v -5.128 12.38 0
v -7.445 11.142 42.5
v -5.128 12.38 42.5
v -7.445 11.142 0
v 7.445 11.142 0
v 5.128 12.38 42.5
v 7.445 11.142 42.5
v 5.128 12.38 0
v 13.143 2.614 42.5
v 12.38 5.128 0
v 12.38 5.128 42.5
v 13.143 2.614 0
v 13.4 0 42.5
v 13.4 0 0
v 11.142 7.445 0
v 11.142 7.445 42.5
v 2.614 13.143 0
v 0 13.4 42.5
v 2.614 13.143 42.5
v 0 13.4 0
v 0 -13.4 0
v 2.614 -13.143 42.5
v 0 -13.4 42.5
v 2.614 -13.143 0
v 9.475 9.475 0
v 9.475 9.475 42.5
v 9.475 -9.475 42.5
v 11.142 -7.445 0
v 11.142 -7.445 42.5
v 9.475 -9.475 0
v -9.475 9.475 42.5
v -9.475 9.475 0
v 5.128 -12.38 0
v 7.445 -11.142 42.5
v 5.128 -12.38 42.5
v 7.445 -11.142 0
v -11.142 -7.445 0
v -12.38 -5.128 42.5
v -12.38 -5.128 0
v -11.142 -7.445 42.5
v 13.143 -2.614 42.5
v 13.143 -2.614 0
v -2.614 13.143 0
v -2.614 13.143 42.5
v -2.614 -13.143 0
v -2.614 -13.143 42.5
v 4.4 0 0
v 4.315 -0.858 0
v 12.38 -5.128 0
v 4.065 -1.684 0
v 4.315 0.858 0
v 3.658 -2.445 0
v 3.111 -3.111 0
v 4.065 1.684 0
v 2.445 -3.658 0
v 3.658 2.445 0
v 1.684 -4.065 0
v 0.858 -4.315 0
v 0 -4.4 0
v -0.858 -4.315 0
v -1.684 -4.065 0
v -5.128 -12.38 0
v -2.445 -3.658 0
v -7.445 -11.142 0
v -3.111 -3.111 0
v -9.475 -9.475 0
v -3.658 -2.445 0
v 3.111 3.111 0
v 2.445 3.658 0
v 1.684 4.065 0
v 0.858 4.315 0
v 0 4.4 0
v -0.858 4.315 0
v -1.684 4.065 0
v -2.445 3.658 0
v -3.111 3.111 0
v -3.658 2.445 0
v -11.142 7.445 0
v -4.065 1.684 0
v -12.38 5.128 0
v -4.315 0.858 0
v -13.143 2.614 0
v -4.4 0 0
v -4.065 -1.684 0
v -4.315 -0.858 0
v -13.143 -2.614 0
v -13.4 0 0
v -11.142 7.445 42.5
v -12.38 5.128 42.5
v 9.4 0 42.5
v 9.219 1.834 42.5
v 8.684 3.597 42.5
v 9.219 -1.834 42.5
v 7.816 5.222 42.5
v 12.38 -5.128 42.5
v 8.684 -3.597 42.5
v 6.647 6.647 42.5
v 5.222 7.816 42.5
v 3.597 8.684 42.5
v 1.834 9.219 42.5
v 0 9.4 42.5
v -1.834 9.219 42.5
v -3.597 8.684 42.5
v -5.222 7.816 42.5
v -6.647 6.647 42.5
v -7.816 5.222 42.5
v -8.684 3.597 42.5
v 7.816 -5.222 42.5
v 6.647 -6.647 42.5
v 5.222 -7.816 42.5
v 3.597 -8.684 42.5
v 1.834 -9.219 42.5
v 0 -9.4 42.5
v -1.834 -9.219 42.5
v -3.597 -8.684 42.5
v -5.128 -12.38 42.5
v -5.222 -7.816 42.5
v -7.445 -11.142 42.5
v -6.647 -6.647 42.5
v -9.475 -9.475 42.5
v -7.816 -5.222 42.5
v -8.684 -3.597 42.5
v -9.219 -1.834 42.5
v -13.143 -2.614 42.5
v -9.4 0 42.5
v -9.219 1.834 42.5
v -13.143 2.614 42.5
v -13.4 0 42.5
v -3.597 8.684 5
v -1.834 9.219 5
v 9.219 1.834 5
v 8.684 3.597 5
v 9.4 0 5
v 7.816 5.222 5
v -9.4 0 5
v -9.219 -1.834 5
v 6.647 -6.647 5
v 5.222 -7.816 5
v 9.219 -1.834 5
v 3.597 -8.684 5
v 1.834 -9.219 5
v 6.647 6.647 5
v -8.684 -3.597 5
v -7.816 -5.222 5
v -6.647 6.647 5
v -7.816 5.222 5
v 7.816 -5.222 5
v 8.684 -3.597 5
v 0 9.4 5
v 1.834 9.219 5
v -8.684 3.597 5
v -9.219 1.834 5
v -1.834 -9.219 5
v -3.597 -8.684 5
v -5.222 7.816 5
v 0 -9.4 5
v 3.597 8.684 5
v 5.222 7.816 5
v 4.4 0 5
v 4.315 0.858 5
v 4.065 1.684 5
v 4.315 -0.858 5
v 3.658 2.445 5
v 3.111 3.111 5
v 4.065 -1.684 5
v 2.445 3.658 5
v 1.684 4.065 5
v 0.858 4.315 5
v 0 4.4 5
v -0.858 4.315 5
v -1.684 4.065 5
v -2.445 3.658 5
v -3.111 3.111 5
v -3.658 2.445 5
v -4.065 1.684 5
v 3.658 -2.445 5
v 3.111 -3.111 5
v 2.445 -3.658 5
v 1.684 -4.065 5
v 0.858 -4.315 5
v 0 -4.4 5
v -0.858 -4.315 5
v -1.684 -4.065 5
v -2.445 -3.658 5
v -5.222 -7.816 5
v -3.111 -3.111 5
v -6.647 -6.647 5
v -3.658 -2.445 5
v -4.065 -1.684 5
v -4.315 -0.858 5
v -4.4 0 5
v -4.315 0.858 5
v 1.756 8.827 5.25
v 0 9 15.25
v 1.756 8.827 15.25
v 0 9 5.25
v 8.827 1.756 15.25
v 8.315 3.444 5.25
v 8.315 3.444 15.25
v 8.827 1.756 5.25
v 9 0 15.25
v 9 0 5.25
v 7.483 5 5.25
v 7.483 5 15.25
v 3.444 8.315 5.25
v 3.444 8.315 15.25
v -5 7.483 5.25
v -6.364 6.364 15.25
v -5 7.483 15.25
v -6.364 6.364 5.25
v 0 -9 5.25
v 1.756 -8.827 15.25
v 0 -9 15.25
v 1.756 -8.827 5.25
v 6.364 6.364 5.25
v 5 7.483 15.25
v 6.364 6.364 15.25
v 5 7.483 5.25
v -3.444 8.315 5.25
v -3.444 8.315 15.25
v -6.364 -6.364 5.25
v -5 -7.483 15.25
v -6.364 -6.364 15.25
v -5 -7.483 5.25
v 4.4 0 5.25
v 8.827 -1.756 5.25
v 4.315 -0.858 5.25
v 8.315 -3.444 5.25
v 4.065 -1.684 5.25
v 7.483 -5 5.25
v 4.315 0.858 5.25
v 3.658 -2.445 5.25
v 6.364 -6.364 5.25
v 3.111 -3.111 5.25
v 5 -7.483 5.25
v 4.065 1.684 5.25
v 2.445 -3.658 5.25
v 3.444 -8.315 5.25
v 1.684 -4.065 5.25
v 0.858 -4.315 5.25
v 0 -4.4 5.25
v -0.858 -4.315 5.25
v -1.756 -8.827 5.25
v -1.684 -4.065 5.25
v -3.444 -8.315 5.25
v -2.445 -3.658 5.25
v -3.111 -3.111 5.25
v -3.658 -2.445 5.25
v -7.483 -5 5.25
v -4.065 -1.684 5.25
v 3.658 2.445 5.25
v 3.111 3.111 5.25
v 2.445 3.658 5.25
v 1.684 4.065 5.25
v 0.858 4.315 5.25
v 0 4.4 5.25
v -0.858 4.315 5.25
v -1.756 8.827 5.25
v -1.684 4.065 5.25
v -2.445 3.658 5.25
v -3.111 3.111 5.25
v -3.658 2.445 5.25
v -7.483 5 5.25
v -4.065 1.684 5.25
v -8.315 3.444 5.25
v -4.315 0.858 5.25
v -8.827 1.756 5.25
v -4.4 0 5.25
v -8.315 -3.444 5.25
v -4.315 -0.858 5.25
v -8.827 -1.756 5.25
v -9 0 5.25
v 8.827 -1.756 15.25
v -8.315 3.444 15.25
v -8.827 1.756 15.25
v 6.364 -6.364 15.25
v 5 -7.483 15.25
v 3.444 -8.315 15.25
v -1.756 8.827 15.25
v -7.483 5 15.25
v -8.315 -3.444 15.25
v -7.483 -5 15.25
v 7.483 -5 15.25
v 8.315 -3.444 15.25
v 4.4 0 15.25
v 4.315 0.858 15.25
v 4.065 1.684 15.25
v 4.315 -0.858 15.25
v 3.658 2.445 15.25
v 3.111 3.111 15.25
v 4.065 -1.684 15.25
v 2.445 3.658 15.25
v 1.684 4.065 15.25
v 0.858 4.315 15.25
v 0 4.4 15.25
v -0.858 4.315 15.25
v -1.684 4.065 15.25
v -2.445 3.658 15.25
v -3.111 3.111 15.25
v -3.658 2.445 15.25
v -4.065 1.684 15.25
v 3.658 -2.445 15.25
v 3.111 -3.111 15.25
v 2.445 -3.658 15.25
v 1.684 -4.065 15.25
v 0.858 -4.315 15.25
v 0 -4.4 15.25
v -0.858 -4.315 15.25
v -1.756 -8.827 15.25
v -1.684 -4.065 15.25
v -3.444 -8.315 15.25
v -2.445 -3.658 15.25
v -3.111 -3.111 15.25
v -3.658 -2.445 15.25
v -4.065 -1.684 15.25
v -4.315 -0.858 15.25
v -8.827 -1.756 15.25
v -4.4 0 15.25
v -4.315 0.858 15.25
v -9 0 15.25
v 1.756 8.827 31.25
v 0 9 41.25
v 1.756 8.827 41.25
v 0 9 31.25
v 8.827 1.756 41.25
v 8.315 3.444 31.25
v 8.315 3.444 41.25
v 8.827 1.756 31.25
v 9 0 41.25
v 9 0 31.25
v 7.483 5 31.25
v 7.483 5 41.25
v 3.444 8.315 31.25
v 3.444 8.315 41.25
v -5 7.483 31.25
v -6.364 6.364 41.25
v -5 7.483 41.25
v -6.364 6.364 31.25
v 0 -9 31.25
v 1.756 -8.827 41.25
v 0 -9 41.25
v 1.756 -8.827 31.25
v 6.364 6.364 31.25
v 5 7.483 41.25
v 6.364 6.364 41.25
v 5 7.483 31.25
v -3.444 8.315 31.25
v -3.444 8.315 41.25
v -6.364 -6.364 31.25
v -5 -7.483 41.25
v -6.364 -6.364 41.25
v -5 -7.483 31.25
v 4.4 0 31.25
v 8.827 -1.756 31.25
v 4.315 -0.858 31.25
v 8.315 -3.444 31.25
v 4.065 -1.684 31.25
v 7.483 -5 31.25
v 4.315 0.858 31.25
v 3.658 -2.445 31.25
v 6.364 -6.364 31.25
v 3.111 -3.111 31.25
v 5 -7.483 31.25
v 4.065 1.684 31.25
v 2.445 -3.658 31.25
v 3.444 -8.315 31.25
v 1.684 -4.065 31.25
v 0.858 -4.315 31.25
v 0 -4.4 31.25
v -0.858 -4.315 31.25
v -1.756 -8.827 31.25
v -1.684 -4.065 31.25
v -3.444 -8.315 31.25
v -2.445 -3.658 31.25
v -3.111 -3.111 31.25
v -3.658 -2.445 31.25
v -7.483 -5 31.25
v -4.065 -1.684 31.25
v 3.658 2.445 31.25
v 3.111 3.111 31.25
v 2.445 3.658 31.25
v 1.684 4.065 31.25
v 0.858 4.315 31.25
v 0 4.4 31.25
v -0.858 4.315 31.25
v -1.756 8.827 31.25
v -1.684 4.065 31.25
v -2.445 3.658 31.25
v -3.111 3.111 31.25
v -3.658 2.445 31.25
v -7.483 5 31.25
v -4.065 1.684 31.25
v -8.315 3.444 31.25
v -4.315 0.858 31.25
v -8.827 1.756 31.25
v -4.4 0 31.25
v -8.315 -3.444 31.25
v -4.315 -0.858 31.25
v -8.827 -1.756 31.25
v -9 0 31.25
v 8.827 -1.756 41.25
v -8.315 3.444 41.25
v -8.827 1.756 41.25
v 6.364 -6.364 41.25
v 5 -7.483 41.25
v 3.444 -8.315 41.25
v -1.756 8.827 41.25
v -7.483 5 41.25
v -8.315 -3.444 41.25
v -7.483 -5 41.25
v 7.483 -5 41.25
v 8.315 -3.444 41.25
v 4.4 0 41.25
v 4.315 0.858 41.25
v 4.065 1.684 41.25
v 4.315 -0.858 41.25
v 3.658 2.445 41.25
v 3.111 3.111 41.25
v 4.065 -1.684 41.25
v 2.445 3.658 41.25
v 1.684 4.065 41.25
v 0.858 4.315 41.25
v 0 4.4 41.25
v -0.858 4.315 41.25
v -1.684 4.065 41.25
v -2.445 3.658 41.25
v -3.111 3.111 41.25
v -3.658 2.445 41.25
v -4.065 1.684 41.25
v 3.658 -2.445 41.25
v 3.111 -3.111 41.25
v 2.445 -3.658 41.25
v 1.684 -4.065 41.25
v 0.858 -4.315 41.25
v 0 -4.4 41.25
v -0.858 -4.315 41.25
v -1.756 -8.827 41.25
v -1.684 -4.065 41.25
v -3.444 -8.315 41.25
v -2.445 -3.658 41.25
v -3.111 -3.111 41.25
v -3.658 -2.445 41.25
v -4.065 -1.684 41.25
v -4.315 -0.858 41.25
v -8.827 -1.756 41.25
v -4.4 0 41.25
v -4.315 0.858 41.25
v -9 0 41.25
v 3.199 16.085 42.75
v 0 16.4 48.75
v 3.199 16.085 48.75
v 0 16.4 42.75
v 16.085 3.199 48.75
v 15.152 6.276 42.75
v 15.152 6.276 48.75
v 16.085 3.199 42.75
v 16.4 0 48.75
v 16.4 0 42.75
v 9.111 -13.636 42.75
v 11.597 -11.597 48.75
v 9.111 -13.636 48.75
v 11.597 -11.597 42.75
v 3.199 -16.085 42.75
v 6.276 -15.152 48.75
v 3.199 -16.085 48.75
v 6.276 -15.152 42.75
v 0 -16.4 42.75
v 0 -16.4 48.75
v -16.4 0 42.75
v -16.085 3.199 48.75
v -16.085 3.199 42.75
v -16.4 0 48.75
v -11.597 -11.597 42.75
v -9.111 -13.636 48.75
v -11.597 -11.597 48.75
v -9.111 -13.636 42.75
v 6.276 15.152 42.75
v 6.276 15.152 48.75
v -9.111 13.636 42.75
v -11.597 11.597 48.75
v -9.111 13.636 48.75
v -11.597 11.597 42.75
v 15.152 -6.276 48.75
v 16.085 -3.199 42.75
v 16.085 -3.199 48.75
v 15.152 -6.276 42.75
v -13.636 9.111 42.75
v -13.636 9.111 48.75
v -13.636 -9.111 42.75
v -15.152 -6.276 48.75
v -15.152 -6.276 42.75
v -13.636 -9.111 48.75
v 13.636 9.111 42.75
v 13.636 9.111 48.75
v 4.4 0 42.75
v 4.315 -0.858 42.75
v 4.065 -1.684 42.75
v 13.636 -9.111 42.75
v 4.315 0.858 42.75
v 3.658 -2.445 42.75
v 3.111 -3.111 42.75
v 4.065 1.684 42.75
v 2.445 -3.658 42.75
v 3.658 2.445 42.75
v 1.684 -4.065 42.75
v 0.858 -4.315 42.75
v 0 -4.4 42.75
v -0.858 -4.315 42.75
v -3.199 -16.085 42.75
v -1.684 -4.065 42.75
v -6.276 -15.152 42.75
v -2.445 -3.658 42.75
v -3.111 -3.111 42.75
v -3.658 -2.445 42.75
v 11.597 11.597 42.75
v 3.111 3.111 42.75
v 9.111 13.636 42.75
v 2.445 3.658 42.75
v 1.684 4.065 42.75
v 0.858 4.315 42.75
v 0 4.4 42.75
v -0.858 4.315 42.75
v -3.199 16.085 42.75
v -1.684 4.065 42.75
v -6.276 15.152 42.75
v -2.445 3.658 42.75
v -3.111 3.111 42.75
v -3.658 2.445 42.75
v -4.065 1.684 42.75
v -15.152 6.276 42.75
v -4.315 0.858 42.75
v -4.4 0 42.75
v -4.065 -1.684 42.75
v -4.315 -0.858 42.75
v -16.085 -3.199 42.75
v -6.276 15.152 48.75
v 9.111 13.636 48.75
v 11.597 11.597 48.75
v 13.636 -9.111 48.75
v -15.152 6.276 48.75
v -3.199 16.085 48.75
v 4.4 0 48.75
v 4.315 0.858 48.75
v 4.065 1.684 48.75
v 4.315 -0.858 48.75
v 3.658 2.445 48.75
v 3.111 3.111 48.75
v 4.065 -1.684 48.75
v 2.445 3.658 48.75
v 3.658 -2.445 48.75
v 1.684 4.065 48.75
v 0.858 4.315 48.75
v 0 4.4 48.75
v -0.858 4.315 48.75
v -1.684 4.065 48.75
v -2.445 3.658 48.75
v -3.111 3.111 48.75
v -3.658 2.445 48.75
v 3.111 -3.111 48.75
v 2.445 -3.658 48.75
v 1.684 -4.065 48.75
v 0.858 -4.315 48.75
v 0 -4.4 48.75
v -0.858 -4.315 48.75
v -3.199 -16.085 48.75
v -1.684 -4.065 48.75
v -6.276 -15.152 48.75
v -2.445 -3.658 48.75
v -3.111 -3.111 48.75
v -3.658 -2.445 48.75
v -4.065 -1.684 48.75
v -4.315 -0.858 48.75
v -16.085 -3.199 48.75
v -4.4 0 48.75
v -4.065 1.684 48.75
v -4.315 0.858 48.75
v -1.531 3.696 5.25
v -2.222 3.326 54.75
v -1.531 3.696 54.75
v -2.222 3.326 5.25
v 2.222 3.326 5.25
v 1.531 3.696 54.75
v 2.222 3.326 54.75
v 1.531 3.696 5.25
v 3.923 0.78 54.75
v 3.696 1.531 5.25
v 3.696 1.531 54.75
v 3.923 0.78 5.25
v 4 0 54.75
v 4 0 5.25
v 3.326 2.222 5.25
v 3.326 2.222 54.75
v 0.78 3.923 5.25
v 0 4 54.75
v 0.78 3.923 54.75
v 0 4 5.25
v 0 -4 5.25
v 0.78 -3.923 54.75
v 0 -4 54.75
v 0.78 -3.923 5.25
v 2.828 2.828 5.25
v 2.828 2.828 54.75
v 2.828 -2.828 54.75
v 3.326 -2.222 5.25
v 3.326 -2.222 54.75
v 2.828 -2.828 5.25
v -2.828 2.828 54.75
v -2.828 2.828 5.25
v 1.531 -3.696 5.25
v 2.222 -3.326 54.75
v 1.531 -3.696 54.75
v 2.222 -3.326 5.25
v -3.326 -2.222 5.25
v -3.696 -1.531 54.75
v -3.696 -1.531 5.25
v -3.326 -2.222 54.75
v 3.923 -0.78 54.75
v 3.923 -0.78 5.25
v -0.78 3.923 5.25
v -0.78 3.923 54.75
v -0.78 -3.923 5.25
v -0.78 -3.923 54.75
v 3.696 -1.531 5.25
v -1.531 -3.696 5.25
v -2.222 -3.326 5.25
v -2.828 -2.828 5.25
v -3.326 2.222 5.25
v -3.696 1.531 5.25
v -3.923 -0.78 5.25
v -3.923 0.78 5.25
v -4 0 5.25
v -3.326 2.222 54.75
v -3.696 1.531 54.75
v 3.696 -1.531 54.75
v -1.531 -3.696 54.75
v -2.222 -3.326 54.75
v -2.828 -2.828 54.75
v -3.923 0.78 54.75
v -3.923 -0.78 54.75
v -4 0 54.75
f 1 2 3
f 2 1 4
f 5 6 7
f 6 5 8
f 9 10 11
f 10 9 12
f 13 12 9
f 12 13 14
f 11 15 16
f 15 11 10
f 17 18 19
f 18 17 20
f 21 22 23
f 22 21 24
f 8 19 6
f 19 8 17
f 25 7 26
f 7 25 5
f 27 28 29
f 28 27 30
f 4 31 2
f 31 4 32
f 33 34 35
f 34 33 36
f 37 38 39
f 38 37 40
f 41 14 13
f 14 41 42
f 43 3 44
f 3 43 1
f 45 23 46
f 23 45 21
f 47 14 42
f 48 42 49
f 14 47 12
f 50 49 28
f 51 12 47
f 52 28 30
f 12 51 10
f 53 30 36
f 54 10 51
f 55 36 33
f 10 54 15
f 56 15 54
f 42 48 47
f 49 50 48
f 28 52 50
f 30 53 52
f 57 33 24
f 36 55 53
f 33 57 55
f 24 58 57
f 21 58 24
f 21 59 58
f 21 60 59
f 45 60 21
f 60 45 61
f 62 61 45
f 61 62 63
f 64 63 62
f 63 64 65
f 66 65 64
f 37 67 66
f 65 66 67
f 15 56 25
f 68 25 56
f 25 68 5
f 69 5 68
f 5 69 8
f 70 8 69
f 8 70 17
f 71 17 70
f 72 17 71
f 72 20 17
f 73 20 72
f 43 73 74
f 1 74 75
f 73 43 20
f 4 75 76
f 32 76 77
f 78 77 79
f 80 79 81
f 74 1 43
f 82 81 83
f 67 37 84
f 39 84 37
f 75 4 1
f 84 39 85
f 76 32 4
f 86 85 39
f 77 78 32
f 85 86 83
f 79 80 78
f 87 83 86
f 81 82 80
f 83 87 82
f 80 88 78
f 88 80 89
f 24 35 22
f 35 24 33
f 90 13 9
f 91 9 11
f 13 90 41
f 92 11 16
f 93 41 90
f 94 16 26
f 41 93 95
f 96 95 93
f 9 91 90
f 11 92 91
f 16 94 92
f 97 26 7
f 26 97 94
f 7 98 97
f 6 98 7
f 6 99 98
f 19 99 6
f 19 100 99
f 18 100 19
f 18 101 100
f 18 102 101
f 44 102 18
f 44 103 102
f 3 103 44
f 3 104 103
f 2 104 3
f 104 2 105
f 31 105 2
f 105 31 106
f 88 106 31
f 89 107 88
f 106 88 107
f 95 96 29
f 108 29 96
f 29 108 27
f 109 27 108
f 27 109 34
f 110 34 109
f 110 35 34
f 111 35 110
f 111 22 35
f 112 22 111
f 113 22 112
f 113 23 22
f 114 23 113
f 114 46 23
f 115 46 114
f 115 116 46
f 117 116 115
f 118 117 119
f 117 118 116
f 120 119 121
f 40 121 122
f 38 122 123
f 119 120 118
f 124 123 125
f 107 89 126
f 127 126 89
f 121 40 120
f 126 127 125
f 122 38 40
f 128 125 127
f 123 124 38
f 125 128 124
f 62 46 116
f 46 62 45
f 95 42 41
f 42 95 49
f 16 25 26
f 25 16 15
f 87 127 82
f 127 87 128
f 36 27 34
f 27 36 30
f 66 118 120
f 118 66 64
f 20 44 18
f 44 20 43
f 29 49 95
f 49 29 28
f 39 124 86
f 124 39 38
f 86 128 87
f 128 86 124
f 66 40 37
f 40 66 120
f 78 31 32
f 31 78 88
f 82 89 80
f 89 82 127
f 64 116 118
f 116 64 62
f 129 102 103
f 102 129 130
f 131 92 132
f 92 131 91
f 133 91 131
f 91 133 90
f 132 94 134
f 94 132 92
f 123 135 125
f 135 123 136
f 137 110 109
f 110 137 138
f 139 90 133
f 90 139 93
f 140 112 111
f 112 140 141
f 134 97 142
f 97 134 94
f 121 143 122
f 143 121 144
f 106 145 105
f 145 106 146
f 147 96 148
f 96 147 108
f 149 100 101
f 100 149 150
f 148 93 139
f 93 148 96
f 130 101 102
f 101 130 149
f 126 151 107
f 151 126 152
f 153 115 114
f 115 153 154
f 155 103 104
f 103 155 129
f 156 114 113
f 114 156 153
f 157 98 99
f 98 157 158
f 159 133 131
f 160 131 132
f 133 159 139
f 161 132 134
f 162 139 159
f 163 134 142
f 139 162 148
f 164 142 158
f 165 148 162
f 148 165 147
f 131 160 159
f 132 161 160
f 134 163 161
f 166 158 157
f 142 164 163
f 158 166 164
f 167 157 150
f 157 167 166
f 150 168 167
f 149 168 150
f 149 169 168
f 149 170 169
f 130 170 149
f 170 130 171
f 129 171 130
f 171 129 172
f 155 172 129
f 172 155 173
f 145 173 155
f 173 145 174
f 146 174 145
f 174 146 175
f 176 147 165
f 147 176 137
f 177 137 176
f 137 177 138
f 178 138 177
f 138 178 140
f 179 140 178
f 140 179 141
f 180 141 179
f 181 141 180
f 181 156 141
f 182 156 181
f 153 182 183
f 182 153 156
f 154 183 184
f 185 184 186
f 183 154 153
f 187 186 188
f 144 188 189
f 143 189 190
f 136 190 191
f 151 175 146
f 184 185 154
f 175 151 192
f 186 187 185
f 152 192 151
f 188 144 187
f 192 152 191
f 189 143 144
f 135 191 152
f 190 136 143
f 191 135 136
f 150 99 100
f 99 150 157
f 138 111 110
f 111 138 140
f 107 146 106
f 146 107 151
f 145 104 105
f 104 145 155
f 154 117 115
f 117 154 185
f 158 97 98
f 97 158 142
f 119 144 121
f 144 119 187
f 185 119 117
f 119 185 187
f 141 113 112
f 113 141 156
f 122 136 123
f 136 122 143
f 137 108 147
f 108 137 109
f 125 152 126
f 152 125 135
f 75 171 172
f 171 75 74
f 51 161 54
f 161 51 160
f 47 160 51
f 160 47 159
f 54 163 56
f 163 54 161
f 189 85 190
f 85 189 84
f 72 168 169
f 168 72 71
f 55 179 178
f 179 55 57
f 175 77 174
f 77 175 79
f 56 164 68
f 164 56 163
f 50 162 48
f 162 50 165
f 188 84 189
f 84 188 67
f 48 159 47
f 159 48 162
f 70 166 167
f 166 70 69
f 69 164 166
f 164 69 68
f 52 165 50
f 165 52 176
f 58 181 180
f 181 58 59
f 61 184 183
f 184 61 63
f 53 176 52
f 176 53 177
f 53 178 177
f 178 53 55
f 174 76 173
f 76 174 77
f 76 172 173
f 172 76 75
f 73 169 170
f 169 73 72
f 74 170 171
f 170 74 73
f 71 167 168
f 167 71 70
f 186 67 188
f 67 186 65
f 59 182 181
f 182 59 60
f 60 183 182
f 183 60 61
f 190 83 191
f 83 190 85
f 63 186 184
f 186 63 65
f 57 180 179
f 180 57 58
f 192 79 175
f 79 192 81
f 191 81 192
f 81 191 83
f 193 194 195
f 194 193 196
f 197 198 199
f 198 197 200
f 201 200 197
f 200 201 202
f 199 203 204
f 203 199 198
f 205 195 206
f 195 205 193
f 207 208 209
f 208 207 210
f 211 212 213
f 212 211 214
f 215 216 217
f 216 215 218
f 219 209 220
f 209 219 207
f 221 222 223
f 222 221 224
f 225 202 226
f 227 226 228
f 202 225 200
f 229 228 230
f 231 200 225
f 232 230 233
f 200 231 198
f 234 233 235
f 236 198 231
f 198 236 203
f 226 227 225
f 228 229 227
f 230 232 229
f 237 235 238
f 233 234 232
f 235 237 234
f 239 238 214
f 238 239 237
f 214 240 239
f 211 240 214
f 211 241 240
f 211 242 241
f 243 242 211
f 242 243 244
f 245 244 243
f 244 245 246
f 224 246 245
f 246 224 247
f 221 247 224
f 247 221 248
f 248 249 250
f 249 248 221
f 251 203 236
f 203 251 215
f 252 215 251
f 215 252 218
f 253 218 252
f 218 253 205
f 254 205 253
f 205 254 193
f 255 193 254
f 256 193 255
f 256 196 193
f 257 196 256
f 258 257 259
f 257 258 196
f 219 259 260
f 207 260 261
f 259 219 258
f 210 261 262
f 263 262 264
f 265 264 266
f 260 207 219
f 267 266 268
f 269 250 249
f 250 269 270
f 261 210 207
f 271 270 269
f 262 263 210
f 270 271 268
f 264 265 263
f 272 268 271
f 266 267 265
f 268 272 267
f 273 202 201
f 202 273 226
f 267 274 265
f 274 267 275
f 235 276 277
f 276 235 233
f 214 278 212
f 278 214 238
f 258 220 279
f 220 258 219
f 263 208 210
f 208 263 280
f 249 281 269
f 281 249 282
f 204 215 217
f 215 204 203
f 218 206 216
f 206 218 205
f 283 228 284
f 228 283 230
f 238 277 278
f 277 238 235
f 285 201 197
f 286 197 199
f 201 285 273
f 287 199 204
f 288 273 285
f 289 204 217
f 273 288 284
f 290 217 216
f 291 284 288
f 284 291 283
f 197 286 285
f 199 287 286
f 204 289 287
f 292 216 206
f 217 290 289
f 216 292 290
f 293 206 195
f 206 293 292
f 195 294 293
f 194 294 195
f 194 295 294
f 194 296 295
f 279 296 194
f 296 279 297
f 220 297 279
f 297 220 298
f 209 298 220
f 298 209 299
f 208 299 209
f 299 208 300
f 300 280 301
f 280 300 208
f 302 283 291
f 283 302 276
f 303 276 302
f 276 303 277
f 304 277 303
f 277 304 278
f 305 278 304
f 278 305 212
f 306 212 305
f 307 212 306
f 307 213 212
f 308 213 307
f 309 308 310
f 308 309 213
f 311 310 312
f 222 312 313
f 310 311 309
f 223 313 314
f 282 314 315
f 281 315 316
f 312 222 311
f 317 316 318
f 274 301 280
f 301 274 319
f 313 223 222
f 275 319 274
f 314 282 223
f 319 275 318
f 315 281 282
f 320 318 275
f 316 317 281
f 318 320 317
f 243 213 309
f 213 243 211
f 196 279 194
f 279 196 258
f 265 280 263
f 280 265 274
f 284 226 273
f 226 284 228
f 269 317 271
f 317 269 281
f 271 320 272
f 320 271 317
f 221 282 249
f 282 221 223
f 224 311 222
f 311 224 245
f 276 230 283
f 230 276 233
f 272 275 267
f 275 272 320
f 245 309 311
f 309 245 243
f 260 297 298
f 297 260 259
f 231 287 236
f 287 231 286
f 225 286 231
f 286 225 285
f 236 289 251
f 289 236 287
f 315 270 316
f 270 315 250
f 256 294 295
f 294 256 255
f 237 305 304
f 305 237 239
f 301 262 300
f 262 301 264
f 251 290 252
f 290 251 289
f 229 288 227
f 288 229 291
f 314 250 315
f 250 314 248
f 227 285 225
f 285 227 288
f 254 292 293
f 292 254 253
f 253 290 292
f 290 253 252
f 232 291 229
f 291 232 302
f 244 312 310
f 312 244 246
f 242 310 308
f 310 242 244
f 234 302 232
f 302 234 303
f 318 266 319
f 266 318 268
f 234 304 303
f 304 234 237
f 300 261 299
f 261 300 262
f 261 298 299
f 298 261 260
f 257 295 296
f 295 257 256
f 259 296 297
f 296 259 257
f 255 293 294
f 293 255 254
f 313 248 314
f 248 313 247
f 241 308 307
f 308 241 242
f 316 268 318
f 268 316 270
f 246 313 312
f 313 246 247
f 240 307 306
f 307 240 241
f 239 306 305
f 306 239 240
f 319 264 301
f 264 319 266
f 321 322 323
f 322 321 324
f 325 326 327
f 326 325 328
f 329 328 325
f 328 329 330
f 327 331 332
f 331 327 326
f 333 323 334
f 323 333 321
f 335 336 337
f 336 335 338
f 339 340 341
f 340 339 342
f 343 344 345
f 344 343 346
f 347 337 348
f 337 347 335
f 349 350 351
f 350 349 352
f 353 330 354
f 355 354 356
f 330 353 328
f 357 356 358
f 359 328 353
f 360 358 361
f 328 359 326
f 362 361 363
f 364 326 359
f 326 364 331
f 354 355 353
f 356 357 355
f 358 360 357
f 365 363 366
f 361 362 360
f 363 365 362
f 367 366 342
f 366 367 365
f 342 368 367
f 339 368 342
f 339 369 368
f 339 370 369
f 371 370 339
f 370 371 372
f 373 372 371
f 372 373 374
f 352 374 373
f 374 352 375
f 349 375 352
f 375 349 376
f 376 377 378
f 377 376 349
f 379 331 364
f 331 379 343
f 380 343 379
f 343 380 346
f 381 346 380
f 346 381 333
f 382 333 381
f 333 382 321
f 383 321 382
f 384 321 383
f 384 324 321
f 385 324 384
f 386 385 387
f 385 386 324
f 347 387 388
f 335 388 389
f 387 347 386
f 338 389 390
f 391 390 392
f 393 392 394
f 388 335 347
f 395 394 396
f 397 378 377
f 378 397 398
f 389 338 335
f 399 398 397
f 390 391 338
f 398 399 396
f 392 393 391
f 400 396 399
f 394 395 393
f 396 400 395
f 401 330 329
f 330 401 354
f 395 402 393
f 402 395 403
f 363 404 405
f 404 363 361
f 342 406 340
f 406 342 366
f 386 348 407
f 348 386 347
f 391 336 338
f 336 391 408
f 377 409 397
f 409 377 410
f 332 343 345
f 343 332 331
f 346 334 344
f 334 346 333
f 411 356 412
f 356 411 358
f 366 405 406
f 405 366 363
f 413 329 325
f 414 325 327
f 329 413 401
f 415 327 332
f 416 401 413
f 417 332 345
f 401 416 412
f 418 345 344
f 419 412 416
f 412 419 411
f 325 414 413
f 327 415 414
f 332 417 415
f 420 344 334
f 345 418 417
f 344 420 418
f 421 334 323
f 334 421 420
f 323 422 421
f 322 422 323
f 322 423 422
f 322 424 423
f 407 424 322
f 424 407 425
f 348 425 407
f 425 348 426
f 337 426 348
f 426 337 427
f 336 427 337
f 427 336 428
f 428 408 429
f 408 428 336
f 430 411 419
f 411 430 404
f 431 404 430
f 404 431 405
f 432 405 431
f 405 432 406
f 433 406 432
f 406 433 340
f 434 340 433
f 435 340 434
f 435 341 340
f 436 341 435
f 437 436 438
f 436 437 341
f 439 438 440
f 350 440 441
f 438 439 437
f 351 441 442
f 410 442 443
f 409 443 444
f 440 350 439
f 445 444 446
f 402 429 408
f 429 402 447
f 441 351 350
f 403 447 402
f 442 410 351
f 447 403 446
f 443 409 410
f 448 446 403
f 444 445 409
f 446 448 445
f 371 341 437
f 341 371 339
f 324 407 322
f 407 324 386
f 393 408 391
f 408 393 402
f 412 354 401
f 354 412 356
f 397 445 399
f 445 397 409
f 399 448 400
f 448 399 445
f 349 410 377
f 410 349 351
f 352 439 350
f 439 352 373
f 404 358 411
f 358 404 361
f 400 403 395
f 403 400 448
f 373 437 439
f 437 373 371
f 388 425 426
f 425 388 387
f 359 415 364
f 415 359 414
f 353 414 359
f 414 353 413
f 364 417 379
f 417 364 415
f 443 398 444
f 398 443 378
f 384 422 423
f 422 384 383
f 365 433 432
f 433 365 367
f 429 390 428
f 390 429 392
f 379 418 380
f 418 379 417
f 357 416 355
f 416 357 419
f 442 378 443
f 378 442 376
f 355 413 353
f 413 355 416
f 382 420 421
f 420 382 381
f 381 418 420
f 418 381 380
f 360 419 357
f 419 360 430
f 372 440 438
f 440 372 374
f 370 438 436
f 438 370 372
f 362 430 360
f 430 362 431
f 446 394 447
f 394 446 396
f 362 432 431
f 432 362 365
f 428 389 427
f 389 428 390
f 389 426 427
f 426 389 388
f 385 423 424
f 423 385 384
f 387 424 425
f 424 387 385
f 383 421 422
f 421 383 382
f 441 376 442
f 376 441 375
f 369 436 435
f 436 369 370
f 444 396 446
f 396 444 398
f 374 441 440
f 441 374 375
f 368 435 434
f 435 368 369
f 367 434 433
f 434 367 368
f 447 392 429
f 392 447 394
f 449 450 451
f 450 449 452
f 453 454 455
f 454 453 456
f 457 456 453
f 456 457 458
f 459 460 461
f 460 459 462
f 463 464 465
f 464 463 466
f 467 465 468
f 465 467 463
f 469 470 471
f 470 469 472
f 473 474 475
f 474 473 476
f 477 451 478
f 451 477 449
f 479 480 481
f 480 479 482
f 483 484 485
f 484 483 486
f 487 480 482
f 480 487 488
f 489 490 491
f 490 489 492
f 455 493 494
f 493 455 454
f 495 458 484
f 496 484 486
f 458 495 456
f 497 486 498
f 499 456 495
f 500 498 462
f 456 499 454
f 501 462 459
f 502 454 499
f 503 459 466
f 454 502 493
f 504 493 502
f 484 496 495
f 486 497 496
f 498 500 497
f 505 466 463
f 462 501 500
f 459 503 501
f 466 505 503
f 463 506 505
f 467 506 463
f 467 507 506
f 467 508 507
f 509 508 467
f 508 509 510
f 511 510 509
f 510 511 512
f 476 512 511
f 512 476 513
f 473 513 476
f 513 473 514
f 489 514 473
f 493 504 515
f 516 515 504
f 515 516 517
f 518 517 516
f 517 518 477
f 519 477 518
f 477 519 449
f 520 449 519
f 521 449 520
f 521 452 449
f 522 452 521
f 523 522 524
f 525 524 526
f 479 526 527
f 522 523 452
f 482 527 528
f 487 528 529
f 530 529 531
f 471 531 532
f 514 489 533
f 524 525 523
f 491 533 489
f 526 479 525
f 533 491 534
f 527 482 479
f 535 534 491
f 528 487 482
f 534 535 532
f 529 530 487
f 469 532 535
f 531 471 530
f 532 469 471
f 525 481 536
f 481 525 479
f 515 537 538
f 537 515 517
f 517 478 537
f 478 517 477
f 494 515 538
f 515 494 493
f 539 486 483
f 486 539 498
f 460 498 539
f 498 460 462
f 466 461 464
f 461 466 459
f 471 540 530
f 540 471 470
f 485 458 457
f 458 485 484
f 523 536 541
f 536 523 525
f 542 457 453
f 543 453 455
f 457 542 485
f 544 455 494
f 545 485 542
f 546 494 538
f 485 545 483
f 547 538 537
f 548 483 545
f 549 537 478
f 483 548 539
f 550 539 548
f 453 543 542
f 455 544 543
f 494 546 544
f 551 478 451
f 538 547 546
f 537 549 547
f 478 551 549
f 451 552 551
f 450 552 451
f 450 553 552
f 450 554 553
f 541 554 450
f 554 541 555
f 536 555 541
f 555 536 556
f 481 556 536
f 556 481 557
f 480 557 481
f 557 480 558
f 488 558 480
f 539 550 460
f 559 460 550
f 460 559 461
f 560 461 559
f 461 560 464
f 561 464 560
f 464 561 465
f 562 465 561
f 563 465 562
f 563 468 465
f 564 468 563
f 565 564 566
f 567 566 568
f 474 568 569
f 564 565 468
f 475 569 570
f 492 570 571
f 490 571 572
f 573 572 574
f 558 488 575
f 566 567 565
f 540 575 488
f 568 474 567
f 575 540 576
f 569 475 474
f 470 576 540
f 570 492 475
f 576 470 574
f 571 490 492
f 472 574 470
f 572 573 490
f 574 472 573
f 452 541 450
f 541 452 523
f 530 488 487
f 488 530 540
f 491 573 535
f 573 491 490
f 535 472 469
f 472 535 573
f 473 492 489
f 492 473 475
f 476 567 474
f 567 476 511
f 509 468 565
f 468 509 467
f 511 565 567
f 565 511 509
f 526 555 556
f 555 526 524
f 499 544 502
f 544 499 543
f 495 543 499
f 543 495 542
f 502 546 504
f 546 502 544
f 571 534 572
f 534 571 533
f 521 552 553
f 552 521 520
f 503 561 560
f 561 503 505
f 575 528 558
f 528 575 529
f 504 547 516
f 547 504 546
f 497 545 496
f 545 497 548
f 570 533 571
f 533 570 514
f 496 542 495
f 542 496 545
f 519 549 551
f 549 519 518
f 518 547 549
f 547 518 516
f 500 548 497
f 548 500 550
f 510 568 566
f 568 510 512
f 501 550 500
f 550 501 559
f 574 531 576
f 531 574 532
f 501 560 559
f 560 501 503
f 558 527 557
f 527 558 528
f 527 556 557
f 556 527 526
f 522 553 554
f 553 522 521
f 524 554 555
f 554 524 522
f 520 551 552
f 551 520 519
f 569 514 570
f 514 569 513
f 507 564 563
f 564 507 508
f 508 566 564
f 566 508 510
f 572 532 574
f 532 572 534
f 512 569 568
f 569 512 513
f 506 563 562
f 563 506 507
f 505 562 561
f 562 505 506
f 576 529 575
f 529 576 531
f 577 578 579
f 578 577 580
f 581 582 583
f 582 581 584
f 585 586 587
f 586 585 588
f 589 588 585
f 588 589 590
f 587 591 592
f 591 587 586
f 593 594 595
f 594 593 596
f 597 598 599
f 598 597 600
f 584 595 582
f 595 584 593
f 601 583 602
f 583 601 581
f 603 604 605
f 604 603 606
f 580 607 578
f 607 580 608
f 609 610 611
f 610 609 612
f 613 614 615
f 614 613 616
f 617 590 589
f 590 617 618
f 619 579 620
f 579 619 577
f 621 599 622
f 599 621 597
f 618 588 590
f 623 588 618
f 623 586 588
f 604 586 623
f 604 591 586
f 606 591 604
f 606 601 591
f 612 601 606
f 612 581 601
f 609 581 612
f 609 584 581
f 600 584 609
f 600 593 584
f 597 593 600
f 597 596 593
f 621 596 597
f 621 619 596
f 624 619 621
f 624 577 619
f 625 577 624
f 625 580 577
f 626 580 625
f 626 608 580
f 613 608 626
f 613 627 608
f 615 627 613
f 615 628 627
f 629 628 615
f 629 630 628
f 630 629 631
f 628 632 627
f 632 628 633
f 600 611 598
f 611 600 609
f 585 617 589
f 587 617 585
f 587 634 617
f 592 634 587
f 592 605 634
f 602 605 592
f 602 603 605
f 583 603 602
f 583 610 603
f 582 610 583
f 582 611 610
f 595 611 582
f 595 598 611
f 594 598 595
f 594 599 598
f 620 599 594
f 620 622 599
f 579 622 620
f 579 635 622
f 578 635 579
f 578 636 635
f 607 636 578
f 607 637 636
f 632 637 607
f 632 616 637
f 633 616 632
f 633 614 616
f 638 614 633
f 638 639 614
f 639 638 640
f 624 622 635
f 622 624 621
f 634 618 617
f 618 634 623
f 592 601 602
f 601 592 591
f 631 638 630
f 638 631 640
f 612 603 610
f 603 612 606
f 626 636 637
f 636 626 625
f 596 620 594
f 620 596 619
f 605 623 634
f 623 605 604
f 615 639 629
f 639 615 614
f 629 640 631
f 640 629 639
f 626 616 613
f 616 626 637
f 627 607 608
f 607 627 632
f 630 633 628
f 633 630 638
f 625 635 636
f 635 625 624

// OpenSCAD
$fn = 32;

// ------------------------------------------------------------------------
// Shaft station: cup d26.8 x 42.5 mm, shaft d8
// Every part is its own module, assembly() places every instance.
// ------------------------------------------------------------------------

// --- part 1 ---
module housing_cup() {
  difference() {
    cylinder(h = 42.5, d = 26.8);
    translate([0, 0, 5]) cylinder(h = 38.5, d = 18.8);
    translate([0, 0, -1]) cylinder(h = 7, d = 8.8);
  }
}

// --- part 2 ---
module bearing_lower() {
  difference() {
      translate([0, 0, 0]) cylinder(h = 10, d = 18);
      translate([0, 0, -1]) cylinder(h = 12, d = 8.8);
    }
}

// --- part 3 ---
module bearing_upper() {
  difference() {
      translate([0, 0, 0]) cylinder(h = 10, d = 18);
      translate([0, 0, -1]) cylinder(h = 12, d = 8.8);
    }
}

// --- part 4 ---
module station_shaft() {
  translate([0, 0, -24.75]) cylinder(h = 49.5, d = 8);
}

// --- part 5 ---
module station_cover() {
  difference() {
    cylinder(h = 6, d = 32.8);
    translate([0, 0, -1]) cylinder(h = 8, d = 8.8);
  }
}

// --- assembly ---
module assembly() {
  color([0.80, 0.24, 0.20]) translate([0, 0, 0]) rotate([0, 0, 0]) housing_cup();
  color([0.20, 0.45, 0.75]) translate([0, 0, 5.25]) rotate([0, 0, 0]) bearing_lower();
  color([0.25, 0.62, 0.32]) translate([0, 0, 31.25]) rotate([0, 0, 0]) bearing_upper();
  color([0.92, 0.70, 0.18]) translate([0, 0, 30]) rotate([0, 0, 0]) station_shaft();
  color([0.58, 0.35, 0.70]) translate([0, 0, 42.75]) rotate([0, 0, 0]) station_cover();
}

assembly();
